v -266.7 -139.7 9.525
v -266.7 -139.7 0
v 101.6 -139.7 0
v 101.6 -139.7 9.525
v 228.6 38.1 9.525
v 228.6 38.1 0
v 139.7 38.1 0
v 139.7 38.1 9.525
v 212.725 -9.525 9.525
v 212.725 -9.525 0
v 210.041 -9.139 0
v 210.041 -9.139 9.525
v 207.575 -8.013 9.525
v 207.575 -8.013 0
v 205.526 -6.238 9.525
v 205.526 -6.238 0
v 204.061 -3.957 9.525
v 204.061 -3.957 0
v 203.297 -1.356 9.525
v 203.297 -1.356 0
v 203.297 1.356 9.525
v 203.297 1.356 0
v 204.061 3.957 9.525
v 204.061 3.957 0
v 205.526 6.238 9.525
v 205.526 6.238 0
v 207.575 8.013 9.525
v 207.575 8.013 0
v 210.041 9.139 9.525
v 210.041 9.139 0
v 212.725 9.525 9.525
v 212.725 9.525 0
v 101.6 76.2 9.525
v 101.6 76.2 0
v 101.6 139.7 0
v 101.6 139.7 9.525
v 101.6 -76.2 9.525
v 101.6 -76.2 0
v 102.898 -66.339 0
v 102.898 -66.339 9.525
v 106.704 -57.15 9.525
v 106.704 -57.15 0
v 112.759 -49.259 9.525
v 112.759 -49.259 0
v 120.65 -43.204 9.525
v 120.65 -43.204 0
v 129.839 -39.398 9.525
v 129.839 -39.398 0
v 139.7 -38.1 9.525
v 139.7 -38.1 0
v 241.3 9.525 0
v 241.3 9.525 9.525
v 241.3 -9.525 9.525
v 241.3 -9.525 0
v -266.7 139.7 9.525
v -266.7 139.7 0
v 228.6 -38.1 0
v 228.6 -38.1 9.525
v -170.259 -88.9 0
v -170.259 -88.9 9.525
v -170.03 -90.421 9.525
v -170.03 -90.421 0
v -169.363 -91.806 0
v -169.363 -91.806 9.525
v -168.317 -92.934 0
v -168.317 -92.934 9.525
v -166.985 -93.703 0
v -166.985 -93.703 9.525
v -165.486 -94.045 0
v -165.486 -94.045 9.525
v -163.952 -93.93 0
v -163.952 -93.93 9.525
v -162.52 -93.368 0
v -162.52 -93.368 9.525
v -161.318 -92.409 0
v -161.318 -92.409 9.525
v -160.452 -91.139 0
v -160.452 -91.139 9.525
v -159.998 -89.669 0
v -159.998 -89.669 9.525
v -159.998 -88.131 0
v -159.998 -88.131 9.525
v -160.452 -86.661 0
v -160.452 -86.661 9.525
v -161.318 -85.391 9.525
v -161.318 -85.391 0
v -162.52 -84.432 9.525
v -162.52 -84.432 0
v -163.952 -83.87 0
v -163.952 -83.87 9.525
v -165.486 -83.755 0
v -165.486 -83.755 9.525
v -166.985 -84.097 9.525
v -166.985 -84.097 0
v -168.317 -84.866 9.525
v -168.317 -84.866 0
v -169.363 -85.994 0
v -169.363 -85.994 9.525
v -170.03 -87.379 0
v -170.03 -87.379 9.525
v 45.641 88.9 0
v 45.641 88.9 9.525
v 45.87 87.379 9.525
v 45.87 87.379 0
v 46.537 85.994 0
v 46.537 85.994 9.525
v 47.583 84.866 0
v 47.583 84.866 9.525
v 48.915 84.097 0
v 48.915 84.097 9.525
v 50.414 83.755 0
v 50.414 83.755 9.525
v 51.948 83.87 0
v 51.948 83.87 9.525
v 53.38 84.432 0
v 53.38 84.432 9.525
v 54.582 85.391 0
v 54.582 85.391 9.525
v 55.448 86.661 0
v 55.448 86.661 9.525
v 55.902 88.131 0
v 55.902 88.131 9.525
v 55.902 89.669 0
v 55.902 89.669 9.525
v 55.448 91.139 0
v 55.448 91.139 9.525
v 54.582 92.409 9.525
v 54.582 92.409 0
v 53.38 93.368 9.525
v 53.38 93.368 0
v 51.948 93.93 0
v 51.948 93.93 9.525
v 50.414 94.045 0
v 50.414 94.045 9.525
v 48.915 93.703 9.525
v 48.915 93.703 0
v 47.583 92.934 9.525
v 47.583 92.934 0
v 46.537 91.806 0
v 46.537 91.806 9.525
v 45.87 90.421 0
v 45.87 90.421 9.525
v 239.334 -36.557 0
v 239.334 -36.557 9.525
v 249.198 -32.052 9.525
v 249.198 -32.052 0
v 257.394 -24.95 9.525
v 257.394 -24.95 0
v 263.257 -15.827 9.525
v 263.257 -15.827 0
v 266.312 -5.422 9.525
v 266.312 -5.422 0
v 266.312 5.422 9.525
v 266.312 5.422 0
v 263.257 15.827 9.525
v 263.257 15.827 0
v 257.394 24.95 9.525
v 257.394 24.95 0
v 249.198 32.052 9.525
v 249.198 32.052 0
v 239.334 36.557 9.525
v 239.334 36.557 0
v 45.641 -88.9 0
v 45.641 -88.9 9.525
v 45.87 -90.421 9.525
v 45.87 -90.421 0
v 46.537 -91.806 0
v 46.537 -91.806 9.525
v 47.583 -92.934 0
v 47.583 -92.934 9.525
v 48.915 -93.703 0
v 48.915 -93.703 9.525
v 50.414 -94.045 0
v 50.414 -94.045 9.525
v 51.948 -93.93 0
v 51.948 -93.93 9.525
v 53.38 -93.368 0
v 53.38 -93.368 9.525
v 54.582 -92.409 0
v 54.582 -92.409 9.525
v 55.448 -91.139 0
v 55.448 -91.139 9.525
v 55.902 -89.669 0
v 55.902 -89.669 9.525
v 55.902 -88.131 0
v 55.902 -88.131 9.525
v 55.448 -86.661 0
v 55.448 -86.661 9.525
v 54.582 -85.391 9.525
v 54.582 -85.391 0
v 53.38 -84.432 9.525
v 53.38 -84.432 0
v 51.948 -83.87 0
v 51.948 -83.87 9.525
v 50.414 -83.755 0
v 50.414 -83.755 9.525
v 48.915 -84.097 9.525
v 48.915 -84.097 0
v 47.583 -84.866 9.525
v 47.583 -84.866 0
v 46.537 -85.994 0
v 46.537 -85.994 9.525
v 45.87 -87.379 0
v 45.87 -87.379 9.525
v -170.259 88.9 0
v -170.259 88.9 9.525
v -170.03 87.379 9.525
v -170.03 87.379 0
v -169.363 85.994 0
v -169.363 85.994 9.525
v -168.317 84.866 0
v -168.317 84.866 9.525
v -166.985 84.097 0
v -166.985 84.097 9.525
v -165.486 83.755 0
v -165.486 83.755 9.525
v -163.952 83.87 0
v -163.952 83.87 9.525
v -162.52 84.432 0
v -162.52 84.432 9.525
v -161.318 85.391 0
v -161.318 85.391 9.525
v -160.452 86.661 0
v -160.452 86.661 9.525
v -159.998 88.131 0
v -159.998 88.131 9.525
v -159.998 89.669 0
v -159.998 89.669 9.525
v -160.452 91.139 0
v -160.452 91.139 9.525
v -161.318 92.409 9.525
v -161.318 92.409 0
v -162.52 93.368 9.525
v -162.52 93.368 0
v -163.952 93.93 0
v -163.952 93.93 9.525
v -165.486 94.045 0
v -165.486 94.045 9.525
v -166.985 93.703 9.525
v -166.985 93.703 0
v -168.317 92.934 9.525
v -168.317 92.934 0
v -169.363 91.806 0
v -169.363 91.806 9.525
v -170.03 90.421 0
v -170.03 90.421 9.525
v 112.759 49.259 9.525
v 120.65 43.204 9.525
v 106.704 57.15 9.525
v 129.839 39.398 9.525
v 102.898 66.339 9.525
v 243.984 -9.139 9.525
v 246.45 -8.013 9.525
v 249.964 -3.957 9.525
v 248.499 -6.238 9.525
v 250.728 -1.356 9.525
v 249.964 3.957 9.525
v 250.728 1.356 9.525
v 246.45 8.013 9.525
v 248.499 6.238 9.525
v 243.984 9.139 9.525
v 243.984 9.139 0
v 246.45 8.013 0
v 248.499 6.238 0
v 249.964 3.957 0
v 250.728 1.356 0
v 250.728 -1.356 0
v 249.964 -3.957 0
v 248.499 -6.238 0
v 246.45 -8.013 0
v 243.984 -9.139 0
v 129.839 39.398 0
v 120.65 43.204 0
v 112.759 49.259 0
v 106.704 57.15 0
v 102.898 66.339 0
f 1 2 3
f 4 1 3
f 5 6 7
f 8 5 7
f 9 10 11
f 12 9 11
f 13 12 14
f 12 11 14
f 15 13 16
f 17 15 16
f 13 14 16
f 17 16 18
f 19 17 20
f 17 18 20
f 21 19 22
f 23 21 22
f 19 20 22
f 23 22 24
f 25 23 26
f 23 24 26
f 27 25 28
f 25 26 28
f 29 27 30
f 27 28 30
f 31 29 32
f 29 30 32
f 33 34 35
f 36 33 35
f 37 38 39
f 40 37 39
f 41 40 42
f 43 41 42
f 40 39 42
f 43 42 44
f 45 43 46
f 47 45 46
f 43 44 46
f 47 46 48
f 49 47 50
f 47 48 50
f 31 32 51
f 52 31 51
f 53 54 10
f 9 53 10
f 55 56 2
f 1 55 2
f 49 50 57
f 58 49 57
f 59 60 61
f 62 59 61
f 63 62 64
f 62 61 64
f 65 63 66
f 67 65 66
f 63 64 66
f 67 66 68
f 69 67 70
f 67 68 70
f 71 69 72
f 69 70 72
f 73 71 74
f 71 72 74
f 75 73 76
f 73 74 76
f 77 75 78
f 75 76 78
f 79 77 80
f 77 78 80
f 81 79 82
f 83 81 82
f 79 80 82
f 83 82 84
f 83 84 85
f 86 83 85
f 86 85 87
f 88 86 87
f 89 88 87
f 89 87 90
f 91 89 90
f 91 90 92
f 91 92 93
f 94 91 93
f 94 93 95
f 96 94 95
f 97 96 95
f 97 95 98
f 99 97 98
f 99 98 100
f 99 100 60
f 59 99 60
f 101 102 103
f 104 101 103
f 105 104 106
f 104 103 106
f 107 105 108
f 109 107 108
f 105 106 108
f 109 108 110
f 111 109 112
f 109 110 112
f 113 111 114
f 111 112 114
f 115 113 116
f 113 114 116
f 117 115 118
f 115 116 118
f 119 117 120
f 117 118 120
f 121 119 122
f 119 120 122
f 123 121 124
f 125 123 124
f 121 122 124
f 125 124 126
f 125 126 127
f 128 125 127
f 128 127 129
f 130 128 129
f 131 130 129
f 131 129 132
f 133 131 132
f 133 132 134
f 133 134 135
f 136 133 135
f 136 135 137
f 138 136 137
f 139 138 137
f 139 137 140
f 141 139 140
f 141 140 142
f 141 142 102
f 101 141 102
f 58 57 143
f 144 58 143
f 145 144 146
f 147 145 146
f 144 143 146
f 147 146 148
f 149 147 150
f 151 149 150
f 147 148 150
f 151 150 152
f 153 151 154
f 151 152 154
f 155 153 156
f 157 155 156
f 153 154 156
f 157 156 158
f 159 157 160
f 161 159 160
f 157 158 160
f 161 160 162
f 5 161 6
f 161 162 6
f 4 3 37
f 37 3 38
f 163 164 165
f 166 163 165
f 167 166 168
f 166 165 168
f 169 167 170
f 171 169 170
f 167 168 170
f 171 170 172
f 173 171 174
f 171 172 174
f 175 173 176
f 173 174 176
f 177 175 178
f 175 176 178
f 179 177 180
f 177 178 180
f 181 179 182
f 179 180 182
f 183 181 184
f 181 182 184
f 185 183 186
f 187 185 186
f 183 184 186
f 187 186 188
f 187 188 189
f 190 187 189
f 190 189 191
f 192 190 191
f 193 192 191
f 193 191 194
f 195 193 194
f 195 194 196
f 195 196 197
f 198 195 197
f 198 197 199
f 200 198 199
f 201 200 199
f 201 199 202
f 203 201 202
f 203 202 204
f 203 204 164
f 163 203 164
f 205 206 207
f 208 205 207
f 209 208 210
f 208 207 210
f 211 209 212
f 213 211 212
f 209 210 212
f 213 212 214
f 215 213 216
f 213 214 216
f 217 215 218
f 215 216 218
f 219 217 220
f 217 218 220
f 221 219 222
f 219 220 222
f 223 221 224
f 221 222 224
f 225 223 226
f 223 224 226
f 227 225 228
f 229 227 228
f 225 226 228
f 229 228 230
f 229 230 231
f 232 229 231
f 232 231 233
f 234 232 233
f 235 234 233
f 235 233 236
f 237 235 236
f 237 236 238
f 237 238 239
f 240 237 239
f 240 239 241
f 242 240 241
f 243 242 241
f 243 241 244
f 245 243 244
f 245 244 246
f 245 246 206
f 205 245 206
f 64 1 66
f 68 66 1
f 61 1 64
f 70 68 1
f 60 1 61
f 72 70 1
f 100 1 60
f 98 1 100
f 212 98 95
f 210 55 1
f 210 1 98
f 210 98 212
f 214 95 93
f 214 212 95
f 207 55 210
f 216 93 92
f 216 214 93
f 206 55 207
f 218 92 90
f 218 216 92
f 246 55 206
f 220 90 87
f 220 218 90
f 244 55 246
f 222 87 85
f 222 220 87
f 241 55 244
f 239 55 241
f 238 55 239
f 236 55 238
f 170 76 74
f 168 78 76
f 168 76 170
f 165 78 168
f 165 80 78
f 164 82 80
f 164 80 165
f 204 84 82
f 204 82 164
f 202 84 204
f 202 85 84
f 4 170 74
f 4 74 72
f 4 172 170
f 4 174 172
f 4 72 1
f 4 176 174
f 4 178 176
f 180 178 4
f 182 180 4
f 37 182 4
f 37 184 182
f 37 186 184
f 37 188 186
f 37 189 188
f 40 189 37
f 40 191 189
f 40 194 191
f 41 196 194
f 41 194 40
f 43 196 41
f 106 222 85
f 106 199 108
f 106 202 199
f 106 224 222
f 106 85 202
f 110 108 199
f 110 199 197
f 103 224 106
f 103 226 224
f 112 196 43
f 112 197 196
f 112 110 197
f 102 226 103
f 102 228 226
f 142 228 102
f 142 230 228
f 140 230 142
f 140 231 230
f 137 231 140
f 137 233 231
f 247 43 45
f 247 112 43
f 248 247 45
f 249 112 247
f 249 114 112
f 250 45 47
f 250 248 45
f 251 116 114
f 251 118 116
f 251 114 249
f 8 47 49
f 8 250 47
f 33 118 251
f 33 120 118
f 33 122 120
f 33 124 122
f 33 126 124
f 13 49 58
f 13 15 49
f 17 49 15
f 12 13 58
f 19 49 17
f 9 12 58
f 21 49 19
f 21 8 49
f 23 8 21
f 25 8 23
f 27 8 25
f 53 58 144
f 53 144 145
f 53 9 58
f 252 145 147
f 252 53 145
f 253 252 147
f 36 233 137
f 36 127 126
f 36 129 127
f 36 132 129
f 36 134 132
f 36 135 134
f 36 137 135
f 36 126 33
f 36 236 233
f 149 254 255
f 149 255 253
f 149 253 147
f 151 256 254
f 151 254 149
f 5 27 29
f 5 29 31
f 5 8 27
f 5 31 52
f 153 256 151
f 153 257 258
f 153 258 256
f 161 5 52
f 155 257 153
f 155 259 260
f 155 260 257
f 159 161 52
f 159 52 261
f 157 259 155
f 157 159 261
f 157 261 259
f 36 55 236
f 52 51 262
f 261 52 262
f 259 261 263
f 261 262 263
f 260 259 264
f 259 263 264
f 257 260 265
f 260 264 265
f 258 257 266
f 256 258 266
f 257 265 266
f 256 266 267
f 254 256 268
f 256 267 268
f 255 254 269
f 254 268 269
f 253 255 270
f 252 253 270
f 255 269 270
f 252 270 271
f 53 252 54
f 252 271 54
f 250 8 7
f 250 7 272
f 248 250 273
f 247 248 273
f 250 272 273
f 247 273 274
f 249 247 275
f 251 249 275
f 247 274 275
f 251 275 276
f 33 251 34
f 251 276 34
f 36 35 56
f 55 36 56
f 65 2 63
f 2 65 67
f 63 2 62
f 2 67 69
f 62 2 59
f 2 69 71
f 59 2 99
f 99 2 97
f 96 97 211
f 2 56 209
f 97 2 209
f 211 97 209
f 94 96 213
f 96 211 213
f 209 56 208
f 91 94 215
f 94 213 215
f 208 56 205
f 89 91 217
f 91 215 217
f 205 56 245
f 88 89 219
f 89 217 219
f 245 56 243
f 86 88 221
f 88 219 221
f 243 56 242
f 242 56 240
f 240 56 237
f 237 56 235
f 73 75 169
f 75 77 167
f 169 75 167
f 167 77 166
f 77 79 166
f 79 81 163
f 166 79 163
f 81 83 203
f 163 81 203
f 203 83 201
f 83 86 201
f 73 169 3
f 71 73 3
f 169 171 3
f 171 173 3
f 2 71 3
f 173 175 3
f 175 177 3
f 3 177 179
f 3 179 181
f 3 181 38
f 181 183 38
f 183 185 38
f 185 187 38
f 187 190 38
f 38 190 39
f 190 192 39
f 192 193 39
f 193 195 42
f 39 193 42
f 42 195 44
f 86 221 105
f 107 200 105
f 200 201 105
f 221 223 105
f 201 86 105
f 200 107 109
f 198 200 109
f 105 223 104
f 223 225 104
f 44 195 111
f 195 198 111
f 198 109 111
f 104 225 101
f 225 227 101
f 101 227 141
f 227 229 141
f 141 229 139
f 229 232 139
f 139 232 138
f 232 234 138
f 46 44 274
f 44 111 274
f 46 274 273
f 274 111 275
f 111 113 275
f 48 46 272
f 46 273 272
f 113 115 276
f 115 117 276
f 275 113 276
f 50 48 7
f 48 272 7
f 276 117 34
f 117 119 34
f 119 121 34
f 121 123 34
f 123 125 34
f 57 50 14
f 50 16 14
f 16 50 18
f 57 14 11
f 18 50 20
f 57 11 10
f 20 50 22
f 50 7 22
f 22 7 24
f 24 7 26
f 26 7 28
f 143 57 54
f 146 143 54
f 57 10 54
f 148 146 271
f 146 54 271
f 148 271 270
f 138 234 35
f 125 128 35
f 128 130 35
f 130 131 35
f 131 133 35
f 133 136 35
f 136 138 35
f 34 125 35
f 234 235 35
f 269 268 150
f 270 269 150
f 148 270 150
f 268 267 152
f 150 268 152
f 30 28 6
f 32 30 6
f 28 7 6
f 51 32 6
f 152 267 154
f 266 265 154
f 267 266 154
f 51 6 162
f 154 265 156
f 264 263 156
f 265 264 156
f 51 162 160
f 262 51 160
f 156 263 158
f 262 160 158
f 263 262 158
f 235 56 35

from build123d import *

# Parameters (mm, degrees)
F1_DEPTH = 9.525
F2_DEPTH = 9.525
F4_D     = 10.31875


# Not quite as in the source:
# - a feature of the source that left no trace in its solid (it failed there, or was rolled back) is left out


with BuildPart() as f1:
    # F0 (on Top) → F1 (new body)
    with BuildSketch(Plane.XY):
        Polygon((-266.7, -139.7), (101.6, -139.7), (101.6, -76.2), (101.6, 76.2), (101.6, 139.7), (-266.7, 139.7), align=None)
    extrude(amount=F1_DEPTH)

    # F0 (on Top) → F2 (join)
    with BuildSketch(Plane.XY):
        with BuildLine():
            Line((101.6, 76.2), (101.6, -76.2))
            ThreePointArc((101.6, -76.2), (112.7592316368, -49.2592316368), (139.7, -38.1))
            Line((139.7, -38.1), (228.6, -38.1))
            ThreePointArc((228.6, -38.1), (266.7, 0), (228.6, 38.1))
            Line((228.6, 38.1), (139.7, 38.1))
            ThreePointArc((139.7, 38.1), (112.7592316368, 49.2592316368), (101.6, 76.2))
        make_face()
        with BuildLine():
            Line((212.725, 9.525), (241.3, 9.525))
            ThreePointArc((241.3, 9.525), (250.825, 0), (241.3, -9.525))
            Line((241.3, -9.525), (212.725, -9.525))
            ThreePointArc((212.725, -9.525), (203.2, 0), (212.725, 9.525))
        make_face(mode=Mode.SUBTRACT)
    extrude(amount=F2_DEPTH)

    # F4 (through all)
    with Locations(Plane(origin=(0, 0, 0), x_dir=(1, 0, 0), z_dir=(0, 0, -1))):
        with Locations((-165.1, -88.9), (-165.1, 88.9), (50.8, 88.9), (50.8, -88.9)):
            Hole(F4_D / 2)


solid = f1.part
